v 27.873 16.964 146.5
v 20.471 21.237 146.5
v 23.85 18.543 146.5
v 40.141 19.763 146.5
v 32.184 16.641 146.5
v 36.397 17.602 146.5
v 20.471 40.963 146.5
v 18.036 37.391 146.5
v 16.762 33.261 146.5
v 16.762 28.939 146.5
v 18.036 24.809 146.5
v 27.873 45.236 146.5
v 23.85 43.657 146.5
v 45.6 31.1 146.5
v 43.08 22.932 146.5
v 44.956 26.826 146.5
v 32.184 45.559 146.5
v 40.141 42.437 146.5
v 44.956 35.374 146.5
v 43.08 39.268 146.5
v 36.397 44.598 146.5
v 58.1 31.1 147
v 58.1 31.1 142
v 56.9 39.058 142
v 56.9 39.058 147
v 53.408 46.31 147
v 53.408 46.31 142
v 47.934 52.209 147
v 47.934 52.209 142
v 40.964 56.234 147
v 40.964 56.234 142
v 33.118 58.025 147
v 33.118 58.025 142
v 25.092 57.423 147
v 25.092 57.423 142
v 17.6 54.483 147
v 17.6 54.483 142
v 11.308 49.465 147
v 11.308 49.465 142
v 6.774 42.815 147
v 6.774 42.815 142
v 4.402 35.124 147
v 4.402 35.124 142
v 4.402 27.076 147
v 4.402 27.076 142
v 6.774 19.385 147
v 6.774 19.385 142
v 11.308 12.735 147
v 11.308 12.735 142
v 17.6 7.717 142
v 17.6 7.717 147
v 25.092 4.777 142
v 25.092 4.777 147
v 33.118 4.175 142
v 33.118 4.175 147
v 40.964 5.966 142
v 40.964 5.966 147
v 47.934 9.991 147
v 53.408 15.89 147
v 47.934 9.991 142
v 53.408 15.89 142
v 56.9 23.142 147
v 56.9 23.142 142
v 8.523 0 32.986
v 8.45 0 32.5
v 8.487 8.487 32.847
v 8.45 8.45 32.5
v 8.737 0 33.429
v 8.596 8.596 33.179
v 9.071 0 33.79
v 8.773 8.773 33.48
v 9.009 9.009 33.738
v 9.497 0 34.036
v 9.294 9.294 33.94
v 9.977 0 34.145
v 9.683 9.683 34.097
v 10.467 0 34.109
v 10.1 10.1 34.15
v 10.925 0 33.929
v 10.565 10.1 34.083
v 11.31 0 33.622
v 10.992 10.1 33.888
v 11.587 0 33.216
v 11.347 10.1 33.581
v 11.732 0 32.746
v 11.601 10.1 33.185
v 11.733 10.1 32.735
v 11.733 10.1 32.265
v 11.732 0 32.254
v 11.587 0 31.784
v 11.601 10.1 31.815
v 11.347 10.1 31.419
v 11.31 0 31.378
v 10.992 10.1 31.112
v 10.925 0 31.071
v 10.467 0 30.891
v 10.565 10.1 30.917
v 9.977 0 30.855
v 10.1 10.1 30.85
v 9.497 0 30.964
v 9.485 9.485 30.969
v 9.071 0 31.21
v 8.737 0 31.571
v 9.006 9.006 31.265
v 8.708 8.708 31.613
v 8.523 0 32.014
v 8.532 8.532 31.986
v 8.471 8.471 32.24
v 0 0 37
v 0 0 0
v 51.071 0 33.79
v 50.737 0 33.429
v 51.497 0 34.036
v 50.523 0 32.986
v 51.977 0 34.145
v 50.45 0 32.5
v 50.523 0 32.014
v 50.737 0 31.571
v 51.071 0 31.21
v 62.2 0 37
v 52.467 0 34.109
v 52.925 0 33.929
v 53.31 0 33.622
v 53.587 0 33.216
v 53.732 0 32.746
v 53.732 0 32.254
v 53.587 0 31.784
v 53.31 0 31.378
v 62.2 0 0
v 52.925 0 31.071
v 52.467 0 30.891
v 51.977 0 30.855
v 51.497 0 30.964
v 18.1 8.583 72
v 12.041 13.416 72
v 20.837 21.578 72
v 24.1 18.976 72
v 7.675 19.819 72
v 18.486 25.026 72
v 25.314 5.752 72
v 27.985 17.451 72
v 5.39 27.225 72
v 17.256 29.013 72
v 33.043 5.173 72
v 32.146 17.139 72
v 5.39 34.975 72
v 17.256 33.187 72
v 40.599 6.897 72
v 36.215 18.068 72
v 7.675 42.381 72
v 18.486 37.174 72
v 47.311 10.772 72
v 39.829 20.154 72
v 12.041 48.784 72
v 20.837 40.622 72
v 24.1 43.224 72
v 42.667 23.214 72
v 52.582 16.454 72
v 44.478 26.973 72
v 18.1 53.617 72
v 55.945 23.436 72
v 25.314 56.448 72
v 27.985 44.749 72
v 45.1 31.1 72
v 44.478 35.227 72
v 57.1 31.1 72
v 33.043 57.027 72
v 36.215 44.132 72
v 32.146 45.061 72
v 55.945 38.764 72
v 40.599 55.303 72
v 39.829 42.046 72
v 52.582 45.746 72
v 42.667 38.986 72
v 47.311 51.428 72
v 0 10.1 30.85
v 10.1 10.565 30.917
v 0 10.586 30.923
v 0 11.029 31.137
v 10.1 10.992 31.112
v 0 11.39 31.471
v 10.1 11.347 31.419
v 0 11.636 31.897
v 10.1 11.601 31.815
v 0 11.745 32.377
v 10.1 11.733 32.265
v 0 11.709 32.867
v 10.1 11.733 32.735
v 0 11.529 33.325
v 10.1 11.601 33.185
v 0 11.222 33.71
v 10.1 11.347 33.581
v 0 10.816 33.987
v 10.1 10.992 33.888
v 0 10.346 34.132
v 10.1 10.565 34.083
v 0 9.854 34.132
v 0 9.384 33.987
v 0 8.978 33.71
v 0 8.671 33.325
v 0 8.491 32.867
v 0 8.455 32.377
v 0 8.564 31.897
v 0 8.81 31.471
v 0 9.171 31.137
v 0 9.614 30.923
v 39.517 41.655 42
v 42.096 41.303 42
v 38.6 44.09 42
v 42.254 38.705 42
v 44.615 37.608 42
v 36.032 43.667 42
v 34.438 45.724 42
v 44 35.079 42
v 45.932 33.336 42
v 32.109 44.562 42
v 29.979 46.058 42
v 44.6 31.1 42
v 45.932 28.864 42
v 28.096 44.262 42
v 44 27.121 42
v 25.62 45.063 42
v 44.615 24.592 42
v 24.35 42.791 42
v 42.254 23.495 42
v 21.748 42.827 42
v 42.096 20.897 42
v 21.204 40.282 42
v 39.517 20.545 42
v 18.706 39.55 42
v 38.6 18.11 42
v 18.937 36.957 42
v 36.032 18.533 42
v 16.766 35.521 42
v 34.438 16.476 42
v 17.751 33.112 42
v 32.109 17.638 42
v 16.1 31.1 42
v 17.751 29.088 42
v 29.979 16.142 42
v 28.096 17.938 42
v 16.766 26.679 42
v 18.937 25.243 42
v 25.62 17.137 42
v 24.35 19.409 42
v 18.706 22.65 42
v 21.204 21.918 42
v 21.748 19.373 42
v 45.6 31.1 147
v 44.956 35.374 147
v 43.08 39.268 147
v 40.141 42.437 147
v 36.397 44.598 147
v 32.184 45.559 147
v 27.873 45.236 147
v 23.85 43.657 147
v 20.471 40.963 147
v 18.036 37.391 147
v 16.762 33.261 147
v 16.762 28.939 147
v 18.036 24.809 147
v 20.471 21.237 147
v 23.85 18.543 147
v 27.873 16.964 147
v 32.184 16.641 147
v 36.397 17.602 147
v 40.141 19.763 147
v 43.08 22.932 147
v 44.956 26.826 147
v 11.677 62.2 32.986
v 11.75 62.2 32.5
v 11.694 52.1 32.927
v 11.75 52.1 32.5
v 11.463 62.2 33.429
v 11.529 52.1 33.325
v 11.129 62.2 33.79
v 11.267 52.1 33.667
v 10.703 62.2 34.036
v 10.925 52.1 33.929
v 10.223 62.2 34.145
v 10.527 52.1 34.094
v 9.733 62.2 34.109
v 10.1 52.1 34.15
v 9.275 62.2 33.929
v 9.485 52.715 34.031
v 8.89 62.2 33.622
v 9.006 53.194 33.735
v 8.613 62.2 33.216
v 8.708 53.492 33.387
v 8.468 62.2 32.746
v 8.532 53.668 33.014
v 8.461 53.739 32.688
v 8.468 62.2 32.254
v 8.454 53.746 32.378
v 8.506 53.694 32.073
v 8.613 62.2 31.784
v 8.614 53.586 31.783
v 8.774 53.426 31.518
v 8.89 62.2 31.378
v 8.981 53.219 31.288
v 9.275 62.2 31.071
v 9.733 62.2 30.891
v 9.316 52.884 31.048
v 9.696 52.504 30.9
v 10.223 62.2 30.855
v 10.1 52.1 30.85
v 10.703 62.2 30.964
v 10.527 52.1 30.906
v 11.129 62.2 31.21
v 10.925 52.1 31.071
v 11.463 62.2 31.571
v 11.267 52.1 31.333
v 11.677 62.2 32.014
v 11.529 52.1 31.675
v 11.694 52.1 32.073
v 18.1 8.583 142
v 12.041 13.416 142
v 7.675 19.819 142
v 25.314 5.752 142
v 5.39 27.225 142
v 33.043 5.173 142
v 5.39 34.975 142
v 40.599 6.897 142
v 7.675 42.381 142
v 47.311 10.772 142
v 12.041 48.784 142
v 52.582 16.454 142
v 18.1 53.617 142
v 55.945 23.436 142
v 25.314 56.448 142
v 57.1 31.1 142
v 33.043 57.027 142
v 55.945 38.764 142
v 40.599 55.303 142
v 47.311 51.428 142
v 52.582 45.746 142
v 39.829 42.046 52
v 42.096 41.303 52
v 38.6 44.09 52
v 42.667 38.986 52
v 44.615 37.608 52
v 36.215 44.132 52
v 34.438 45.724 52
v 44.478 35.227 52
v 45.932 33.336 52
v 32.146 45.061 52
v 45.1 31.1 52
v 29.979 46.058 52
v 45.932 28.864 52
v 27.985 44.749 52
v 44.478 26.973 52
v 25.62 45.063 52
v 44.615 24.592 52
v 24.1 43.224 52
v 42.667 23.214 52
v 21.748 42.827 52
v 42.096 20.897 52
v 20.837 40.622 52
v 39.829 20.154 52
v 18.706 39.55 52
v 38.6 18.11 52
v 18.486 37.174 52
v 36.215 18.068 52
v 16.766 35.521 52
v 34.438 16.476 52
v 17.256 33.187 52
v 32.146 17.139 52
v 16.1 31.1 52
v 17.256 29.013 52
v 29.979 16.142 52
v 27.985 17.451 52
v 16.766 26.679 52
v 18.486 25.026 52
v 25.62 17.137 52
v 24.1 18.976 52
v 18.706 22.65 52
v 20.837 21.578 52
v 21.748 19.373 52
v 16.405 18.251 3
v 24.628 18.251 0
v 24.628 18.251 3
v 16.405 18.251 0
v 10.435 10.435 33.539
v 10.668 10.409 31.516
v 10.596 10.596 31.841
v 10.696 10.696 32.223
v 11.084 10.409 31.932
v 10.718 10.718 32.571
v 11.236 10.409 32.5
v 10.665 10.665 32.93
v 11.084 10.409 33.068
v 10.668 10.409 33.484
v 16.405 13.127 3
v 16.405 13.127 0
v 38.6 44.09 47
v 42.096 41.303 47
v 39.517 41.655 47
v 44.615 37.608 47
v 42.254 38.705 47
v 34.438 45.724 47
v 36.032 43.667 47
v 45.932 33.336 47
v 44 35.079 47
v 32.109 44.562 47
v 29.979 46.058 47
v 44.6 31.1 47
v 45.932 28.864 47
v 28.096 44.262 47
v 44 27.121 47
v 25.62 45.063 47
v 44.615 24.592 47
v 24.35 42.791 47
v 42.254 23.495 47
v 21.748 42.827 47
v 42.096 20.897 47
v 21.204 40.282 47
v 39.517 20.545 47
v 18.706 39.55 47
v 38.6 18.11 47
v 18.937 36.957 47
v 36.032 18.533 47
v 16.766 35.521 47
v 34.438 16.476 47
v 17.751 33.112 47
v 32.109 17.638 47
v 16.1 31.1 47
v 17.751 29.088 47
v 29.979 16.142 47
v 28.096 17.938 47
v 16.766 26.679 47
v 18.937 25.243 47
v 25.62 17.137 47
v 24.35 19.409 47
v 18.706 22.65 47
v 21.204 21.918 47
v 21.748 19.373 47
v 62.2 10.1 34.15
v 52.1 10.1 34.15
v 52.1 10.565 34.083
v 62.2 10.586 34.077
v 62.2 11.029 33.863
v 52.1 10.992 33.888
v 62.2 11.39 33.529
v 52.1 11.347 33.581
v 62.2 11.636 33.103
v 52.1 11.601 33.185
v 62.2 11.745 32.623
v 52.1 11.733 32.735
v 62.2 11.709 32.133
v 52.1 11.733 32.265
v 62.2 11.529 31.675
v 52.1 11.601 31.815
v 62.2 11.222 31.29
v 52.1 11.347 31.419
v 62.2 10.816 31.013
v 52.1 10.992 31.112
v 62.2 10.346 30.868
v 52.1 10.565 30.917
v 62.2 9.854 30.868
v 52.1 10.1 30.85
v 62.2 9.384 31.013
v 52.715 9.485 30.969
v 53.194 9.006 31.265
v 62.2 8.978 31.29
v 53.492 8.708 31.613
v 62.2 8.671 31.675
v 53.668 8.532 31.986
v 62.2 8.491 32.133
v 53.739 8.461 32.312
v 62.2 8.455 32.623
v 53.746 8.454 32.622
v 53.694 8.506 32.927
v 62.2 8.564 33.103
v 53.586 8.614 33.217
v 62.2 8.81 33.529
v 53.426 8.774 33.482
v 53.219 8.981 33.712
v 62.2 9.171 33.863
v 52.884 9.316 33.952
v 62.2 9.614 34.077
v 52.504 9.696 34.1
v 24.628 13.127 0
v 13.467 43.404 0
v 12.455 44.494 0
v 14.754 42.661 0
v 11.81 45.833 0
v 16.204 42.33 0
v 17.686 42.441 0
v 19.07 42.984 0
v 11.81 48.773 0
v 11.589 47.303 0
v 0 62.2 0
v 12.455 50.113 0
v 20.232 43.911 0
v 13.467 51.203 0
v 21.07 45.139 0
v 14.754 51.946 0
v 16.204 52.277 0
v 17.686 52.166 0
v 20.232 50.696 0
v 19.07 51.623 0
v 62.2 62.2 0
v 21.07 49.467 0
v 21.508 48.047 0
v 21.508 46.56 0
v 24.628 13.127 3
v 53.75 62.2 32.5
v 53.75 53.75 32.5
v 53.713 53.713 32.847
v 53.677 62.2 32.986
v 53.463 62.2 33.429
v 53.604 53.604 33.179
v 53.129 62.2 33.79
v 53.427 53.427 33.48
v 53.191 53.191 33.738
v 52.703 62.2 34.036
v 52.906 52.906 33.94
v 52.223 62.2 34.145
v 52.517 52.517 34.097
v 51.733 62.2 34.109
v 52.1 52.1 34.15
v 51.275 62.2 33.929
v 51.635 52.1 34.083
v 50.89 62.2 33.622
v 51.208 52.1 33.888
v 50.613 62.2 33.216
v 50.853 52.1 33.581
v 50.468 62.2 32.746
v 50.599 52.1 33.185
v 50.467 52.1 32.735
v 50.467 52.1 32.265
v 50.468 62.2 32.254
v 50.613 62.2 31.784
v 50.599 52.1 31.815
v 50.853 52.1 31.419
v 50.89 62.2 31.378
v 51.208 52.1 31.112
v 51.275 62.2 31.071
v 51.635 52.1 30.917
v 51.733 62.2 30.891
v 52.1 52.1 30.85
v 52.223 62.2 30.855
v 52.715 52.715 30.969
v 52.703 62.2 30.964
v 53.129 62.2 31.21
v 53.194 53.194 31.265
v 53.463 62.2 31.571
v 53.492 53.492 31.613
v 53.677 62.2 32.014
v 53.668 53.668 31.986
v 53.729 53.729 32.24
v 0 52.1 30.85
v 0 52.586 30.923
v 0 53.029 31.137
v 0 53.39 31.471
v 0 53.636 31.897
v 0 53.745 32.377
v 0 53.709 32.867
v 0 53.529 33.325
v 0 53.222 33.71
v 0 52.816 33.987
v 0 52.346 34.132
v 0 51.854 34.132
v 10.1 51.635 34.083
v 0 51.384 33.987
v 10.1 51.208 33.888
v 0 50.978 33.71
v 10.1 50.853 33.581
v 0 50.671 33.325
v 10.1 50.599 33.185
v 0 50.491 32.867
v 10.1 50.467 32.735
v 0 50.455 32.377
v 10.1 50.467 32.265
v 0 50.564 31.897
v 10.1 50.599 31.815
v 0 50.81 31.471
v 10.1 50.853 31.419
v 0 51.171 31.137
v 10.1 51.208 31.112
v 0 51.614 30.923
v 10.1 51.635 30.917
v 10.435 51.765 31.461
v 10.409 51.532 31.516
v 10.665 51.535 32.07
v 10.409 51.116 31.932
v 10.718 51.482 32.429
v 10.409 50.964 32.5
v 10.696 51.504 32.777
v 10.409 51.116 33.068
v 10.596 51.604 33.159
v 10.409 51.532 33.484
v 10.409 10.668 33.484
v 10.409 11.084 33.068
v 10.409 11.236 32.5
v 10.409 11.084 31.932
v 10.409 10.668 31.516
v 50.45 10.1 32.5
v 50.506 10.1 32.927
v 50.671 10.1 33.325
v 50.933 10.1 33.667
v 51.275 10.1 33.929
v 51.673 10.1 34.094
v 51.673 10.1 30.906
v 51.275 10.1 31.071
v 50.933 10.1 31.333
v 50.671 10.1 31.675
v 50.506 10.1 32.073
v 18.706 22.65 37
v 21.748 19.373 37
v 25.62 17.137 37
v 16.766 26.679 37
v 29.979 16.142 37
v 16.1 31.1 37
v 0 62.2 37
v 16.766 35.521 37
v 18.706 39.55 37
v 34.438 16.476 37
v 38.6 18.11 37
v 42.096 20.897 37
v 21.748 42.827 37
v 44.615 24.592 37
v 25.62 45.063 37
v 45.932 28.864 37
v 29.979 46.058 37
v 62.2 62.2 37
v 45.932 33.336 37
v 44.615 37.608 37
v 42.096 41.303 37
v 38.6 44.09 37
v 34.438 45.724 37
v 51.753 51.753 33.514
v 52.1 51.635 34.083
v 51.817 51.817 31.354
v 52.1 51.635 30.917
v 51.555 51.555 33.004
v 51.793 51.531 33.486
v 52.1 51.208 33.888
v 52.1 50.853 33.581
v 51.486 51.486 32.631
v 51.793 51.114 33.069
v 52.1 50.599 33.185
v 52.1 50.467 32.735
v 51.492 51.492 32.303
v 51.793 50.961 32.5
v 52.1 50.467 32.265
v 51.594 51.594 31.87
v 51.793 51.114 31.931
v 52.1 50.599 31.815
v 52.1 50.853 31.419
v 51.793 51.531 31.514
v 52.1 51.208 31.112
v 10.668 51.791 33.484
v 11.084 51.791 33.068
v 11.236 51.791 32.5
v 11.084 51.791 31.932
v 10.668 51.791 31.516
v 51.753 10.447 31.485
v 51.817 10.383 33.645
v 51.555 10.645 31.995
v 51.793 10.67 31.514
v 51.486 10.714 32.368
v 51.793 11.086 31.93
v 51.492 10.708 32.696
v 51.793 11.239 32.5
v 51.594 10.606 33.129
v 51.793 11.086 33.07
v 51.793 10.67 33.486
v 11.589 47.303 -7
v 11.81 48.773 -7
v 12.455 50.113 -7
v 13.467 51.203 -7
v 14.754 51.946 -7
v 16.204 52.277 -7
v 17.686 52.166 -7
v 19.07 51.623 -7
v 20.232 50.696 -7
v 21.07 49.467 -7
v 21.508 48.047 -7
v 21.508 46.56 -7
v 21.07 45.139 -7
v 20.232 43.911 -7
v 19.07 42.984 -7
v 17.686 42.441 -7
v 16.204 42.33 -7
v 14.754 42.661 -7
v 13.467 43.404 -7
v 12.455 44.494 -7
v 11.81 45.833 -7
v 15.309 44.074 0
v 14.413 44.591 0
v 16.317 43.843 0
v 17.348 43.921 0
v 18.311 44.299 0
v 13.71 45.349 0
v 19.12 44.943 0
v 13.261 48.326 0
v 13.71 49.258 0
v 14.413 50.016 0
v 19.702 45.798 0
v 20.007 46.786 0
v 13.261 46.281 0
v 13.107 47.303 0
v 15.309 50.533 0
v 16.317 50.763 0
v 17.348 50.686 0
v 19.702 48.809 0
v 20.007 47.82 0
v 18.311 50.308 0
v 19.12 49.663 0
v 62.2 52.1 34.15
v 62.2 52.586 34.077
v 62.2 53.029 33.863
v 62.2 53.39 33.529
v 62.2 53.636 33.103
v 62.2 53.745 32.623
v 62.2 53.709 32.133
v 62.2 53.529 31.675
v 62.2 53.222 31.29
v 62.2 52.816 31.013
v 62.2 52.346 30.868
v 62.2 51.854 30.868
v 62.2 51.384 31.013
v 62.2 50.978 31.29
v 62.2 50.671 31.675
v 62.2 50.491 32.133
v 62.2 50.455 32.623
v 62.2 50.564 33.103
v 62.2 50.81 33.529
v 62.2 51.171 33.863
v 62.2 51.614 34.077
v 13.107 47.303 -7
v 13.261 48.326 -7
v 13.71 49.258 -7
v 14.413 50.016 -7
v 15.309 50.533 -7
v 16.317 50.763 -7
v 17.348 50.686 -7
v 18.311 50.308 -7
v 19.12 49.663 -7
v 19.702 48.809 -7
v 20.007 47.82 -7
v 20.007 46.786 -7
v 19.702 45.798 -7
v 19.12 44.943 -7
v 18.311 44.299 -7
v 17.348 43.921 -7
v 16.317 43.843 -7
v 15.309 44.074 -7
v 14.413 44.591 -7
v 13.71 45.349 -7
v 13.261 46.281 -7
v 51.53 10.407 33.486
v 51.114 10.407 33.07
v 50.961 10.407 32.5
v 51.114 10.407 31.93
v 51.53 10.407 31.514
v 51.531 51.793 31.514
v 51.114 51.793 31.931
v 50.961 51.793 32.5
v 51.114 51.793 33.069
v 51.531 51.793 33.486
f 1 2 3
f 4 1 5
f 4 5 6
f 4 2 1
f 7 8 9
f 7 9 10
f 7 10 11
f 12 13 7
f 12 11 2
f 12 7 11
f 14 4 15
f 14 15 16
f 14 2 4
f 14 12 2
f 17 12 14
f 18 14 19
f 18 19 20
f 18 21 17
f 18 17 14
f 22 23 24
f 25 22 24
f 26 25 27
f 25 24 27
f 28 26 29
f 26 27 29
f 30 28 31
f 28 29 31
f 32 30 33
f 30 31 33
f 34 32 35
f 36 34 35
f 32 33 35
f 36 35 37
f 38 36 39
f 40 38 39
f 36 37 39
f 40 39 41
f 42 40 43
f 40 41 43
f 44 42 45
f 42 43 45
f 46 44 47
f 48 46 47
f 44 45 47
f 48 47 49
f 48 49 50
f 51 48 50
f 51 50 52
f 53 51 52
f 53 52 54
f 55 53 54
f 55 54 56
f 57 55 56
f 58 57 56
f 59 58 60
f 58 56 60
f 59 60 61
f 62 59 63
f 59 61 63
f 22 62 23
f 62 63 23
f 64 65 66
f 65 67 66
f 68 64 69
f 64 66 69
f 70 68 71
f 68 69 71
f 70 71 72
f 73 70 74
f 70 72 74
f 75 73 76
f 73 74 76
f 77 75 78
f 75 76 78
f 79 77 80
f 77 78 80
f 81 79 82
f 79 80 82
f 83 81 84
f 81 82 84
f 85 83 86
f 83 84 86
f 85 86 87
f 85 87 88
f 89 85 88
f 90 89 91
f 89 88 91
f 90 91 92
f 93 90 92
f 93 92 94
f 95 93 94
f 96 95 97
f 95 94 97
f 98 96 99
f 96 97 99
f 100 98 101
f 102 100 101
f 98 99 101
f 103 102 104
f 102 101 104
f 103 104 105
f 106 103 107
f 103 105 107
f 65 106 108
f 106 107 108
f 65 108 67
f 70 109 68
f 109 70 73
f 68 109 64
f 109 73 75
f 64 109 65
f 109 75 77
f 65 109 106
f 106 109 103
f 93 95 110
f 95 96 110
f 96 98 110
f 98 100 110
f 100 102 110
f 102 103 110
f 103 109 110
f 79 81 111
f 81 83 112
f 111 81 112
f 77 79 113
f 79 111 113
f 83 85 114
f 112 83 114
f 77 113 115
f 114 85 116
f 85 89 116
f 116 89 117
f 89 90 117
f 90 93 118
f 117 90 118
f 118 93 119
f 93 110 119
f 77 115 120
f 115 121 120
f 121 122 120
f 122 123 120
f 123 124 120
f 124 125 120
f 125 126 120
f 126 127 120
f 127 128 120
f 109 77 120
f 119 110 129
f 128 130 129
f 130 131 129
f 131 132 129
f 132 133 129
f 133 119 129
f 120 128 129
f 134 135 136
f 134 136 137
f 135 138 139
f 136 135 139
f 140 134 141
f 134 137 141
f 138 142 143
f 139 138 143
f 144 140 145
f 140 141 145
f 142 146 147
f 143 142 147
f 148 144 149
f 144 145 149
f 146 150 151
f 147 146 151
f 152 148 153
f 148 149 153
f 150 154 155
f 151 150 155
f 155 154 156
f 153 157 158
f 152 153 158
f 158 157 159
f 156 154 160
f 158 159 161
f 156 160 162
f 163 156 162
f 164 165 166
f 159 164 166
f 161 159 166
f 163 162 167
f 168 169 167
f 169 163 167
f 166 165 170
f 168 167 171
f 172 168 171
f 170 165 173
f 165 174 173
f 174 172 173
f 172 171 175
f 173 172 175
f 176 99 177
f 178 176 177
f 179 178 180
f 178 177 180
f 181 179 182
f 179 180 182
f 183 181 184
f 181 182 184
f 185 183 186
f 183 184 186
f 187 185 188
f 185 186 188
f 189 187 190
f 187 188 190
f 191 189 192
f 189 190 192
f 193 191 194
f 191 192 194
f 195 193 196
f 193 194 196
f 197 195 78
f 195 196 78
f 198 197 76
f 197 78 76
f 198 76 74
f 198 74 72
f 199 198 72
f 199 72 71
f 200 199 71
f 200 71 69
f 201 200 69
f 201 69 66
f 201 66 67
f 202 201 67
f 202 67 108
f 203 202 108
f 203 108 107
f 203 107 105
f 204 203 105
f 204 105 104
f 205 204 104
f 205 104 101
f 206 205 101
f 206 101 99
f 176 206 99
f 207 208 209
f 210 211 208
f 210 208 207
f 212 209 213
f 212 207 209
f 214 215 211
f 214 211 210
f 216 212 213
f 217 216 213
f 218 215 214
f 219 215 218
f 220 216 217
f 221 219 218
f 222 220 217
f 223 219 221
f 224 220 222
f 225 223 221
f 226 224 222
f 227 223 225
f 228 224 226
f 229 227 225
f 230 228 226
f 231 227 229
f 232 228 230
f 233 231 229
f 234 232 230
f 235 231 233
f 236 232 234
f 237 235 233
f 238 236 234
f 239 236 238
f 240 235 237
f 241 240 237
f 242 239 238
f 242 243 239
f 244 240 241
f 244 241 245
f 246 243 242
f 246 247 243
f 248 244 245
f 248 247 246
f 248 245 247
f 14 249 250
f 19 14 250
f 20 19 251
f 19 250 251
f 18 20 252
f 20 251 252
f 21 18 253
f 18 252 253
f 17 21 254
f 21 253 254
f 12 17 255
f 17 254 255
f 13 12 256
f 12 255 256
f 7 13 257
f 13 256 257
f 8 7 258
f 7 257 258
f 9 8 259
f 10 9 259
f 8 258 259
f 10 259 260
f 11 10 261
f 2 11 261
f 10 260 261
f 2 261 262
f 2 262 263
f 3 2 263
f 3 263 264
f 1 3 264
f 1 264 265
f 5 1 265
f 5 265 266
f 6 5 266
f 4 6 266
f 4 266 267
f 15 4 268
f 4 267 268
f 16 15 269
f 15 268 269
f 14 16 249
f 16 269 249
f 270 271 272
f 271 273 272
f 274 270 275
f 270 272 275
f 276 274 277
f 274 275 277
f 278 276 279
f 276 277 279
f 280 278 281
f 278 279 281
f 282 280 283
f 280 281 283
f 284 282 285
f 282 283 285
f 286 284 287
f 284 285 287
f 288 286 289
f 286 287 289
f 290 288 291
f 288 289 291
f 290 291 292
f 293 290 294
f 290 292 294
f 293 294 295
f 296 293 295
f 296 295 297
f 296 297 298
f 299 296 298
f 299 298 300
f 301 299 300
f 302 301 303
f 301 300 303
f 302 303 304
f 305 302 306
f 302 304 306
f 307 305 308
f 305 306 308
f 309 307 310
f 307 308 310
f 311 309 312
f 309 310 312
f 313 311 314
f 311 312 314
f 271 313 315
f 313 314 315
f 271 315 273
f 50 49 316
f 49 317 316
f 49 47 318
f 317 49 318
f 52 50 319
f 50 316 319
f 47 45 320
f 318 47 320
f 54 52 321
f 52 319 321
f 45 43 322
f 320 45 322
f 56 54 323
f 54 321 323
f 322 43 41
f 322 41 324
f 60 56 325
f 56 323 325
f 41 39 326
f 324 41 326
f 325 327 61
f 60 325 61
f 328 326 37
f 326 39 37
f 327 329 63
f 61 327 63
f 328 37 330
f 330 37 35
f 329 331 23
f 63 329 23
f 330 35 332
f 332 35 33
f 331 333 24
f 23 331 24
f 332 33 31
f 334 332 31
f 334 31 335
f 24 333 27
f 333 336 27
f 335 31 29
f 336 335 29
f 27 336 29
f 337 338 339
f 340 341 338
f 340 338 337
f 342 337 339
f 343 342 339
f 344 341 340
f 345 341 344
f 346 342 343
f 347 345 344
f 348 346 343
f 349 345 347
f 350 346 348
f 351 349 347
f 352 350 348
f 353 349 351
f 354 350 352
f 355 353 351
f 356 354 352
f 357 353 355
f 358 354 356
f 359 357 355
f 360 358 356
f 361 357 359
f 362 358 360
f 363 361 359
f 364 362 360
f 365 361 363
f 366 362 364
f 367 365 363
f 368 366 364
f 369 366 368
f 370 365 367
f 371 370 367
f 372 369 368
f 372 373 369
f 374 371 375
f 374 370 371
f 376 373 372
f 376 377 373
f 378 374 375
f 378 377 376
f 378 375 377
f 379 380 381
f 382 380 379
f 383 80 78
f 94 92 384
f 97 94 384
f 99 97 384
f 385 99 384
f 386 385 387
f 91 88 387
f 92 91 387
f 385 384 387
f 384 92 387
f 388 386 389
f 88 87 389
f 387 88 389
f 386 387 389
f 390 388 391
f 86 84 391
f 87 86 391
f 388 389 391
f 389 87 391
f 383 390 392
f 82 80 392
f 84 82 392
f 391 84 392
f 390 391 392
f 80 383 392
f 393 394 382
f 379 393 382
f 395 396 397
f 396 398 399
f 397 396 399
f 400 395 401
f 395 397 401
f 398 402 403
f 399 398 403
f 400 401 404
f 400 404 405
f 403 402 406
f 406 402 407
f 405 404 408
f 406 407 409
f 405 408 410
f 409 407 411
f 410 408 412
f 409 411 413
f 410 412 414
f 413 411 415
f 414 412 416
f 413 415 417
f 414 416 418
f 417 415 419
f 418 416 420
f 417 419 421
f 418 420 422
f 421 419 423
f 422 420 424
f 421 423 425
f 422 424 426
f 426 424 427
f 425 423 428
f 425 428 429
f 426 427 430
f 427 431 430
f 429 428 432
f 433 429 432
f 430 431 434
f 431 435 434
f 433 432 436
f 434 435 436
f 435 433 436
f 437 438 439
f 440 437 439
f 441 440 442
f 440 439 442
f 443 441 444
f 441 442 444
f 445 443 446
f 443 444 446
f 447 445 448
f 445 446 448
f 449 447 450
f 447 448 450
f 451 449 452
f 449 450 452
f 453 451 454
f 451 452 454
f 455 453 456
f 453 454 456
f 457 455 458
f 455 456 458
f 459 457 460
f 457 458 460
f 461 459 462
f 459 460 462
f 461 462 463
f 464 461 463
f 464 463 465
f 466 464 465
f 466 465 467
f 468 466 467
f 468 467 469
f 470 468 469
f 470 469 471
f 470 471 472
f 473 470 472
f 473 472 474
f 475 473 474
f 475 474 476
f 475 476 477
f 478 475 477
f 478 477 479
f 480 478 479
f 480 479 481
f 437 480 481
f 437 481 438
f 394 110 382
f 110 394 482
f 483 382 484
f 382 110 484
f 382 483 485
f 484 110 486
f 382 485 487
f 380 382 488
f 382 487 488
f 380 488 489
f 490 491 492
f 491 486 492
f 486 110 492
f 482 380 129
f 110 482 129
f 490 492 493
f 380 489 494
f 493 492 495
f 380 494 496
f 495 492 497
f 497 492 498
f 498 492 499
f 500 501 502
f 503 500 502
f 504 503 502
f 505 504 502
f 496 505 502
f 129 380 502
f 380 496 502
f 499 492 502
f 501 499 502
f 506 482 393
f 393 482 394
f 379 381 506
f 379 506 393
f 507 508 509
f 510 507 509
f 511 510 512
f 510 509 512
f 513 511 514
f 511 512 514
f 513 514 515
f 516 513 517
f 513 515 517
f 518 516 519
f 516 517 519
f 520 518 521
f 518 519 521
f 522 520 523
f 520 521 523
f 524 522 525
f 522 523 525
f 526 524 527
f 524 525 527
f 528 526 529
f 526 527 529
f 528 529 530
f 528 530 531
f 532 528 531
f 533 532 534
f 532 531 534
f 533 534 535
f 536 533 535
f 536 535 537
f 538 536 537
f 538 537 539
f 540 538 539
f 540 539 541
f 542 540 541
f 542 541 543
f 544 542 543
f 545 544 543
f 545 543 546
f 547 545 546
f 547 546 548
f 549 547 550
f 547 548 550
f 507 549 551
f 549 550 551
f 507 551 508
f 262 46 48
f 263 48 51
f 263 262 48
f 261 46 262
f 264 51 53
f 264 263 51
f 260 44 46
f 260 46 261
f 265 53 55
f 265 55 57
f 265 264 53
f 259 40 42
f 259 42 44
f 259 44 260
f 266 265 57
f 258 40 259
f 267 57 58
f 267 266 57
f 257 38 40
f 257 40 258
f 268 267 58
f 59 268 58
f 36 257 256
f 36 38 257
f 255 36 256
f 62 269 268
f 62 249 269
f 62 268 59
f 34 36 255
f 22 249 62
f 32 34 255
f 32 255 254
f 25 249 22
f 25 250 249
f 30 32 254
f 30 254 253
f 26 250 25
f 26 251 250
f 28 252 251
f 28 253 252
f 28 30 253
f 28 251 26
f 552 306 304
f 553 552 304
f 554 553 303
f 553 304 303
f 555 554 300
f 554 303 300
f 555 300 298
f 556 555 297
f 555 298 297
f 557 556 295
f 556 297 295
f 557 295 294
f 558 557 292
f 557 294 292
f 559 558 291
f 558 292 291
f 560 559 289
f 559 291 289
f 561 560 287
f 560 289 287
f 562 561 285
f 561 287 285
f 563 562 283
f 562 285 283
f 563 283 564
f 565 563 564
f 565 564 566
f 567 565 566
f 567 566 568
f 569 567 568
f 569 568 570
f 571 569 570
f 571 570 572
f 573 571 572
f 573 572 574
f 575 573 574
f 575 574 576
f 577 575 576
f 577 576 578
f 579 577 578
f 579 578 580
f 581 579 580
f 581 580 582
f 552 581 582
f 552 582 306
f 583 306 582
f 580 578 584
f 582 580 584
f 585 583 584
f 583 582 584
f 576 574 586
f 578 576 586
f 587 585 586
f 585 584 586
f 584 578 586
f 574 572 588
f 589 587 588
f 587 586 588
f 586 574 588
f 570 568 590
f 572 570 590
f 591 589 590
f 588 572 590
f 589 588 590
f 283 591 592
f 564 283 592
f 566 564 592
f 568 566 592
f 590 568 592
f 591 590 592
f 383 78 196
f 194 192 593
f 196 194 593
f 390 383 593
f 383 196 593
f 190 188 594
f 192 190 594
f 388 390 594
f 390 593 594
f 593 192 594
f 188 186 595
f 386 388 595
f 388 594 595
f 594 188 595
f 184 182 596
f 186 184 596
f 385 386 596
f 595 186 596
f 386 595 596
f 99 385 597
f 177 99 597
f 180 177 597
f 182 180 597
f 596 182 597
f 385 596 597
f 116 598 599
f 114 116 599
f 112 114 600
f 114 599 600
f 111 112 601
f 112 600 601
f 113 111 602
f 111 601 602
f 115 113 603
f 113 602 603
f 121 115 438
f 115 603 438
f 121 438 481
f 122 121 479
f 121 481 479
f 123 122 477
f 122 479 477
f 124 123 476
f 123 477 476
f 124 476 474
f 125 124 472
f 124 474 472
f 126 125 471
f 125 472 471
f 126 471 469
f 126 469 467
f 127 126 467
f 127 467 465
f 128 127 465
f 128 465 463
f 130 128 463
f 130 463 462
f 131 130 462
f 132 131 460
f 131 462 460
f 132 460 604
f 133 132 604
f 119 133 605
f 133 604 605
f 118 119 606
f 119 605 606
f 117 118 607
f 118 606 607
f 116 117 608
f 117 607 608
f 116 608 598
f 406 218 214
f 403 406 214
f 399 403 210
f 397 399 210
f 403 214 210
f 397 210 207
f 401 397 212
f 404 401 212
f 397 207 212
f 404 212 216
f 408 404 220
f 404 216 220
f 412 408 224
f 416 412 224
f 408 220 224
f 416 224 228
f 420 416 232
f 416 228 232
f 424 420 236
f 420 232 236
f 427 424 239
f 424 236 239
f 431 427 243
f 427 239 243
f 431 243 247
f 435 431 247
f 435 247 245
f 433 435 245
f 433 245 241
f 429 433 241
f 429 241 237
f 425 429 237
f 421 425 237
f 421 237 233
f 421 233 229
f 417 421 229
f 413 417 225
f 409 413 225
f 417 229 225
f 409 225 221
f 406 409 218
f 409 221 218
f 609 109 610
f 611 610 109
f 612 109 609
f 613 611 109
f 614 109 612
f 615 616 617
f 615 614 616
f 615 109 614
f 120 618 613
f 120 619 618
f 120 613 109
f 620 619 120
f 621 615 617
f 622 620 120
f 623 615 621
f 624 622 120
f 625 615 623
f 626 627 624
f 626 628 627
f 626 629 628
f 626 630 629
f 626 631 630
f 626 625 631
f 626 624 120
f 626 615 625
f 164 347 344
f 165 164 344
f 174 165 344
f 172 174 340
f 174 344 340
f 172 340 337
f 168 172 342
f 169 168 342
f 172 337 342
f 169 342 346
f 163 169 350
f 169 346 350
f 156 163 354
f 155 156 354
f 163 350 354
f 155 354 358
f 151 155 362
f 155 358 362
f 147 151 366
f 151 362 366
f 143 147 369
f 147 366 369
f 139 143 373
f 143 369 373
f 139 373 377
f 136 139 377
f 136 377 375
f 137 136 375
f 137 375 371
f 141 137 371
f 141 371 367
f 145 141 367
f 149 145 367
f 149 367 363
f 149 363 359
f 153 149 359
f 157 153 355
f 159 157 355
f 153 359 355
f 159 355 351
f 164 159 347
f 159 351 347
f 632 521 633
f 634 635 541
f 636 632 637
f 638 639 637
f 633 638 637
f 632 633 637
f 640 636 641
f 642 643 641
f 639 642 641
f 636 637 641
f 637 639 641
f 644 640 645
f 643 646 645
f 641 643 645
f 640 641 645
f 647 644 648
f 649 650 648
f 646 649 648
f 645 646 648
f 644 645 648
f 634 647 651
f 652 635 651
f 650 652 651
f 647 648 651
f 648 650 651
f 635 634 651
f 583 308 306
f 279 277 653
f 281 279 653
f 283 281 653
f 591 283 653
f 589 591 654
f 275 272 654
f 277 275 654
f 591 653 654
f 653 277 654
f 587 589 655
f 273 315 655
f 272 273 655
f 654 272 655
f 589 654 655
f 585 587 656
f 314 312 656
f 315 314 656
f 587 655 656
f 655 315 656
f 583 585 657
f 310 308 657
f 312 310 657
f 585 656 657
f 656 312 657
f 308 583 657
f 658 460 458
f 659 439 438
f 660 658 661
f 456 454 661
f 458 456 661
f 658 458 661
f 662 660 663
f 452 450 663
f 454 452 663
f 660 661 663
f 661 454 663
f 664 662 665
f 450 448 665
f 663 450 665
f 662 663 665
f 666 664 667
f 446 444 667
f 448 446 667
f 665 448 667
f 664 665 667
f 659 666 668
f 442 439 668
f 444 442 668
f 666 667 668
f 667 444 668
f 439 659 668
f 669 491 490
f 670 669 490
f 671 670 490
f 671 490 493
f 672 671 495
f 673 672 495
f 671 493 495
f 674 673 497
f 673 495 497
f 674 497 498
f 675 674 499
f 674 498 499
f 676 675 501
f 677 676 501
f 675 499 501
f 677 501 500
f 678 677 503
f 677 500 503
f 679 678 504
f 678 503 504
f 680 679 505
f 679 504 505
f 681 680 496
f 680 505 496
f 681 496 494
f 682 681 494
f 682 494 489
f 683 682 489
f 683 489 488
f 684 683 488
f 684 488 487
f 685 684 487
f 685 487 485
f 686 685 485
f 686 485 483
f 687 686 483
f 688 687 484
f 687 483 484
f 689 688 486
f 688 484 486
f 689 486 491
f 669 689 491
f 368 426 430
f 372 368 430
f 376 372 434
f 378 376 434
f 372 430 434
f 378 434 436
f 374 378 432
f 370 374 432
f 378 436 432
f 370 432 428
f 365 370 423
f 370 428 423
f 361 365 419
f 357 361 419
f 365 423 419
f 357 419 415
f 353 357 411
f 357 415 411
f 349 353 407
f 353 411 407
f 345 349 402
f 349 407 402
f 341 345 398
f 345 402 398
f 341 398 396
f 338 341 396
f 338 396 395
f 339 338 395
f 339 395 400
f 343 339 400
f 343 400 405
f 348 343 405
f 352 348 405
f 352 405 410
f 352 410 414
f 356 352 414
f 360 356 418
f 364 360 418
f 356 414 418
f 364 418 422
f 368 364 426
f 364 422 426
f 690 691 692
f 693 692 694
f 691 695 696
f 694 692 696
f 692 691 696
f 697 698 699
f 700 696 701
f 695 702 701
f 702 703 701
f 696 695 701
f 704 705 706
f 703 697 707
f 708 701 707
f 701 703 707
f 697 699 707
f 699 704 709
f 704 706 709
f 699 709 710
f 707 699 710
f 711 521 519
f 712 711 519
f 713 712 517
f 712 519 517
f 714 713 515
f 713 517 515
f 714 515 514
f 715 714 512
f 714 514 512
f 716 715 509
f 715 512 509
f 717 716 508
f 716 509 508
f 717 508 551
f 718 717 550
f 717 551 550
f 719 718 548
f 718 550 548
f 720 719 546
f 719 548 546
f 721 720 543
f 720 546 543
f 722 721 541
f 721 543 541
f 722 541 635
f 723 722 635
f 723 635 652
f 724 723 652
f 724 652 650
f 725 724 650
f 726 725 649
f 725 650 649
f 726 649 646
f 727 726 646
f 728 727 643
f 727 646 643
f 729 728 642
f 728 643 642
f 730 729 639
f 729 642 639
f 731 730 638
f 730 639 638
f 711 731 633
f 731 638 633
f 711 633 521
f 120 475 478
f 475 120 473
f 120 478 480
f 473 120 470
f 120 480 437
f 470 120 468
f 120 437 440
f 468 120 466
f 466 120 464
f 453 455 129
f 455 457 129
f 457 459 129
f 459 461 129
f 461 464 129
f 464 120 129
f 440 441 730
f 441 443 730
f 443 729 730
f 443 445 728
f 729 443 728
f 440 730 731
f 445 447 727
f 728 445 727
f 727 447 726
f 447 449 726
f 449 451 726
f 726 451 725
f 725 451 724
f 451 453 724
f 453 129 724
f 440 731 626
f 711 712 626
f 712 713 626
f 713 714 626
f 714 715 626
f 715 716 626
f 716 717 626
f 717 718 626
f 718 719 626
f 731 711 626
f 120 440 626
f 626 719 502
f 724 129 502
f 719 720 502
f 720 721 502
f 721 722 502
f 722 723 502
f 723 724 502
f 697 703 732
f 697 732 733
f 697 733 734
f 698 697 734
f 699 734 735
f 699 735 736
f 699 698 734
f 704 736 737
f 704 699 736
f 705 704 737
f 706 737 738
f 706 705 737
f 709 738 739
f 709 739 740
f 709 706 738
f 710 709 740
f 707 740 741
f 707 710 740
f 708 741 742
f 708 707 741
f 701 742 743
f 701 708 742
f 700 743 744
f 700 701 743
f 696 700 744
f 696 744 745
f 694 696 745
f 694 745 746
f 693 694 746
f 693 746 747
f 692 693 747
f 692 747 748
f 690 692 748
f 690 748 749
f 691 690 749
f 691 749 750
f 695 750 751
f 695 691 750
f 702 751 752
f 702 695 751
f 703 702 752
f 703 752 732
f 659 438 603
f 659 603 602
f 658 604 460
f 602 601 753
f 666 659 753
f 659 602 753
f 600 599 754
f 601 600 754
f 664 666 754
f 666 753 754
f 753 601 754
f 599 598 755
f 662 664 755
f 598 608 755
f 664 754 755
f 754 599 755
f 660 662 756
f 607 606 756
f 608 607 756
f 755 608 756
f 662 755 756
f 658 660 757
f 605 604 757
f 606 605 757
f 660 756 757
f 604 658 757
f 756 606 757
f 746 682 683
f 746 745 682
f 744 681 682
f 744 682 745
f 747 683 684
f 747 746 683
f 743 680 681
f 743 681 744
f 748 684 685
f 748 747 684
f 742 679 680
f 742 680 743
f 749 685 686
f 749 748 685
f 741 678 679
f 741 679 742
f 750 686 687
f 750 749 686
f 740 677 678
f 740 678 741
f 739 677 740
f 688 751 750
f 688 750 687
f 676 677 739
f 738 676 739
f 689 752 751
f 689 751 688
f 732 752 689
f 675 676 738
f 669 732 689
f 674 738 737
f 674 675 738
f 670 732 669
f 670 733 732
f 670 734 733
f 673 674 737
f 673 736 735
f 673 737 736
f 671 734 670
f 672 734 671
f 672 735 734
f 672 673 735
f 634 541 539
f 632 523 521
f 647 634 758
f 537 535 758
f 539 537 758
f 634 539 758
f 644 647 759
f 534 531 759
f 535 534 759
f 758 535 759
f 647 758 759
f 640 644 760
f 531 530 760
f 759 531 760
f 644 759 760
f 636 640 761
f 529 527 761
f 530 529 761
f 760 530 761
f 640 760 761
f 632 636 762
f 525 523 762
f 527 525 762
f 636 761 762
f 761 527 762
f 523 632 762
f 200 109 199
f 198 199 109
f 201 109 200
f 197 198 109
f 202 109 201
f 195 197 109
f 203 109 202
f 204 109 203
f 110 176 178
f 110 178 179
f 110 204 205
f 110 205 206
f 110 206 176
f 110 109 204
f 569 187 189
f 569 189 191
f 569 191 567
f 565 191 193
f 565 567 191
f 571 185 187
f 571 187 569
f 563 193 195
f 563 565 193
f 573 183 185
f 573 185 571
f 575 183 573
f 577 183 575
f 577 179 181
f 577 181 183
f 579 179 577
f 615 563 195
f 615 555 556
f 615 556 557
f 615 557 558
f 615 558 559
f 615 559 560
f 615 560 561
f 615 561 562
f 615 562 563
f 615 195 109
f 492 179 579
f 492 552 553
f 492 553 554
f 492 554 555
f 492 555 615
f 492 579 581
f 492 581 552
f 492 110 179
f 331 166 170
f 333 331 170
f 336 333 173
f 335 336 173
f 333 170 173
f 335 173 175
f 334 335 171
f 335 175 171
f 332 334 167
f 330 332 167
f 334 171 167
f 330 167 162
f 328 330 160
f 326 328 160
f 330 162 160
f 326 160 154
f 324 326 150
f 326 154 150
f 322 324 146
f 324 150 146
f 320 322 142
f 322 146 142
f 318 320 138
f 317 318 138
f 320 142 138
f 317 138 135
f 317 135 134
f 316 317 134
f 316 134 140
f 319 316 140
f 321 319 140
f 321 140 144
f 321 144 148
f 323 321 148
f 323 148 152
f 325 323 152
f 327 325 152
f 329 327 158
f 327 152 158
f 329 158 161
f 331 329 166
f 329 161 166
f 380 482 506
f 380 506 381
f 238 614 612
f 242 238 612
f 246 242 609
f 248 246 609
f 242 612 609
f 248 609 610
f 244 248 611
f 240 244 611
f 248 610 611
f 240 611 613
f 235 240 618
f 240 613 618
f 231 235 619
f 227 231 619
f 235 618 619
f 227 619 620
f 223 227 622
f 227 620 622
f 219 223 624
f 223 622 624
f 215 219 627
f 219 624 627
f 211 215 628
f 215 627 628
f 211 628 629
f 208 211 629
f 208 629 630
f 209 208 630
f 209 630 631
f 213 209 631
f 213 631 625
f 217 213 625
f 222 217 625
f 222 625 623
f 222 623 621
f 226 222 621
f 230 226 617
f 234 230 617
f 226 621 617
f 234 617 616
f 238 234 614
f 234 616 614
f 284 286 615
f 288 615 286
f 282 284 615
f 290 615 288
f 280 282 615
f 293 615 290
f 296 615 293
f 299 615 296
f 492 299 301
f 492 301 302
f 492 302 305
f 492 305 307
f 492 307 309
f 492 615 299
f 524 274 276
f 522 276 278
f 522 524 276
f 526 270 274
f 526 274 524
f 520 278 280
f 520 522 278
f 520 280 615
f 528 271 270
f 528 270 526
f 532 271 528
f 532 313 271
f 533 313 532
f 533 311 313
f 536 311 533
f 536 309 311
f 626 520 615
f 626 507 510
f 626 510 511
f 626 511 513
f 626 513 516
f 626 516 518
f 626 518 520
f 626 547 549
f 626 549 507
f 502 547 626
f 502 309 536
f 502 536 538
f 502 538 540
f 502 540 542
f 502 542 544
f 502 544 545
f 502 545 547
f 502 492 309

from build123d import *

# Parameters (mm, degrees)
SKETCH_1_W             = 62.2
SKETCH_1_H             = 62.2
EXTRUDE_1_DEPTH        = 37
SKETCH_2_R             = 15
EXTRUDE_2_DEPTH        = 5
SKETCH_3_R             = 13.5
EXTRUDE_3_DEPTH        = 5
SKETCH_4_R             = 15
EXTRUDE_4_DEPTH        = 5
SKETCH_5_R             = 14
EXTRUDE_5_DEPTH        = 20
SKETCH_6_R             = 26
EXTRUDE_6_DEPTH        = 70
SKETCH_7_R             = 27
EXTRUDE_7_DEPTH        = 5
SKETCH_8_R             = 14.5
CUT_EXTRUDE_1_DEPTH    = 0.5
SKETCH_9_R             = 4.987570285
SKETCH_9_R_2           = 3.46960963
EXTRUDE_8_DEPTH        = 7
SKETCH_10_W            = 8.223130645
SKETCH_10_H            = 5.124180357
CUT_EXTRUDE_2_DEPTH    = 3
HOLE_WIZARD_M4_1_D     = 3.3
HOLE_WIZARD_M4_1_DEPTH = 10.1
HOLE_WIZARD_M4_1_TIP   = 0.991420021
HOLE_WIZARD_M4_2_D     = 3.3
HOLE_WIZARD_M4_2_DEPTH = 10.1
HOLE_WIZARD_M4_2_TIP   = 0.991420021
HOLE_WIZARD_M4_3_D     = 3.3
HOLE_WIZARD_M4_3_DEPTH = 10.1
HOLE_WIZARD_M4_3_TIP   = 0.991420021
HOLE_WIZARD_M4_4_D     = 3.3
HOLE_WIZARD_M4_4_DEPTH = 10.1
HOLE_WIZARD_M4_4_TIP   = 0.991420021


with BuildPart() as part:
    # 草图1 → 凸台-拉伸1 (new body)
    with BuildSketch(Plane.XY):
        with Locations((31.1, 31.1)):
            Rectangle(SKETCH_1_W, SKETCH_1_H)
    extrude(amount=EXTRUDE_1_DEPTH)

    # 草图2 → 凸台-拉伸2 (add)
    with BuildSketch(Plane.XY.offset(37)):
        with Locations(Location((31.1, 31.1, 0), (0, 0, 180))):
            Circle(SKETCH_2_R)
    extrude(amount=EXTRUDE_2_DEPTH)

    # 草图3 → 凸台-拉伸3 (add)
    with BuildSketch(Plane.XY.offset(42)):
        with Locations((31.1, 31.1)):
            Circle(SKETCH_3_R)
    extrude(amount=EXTRUDE_3_DEPTH)

    # 草图4 → 凸台-拉伸4 (add)
    with BuildSketch(Plane.XY.offset(47)):
        with Locations(Location((31.1, 31.1, 0), (0, 0, 180))):
            Circle(SKETCH_4_R)
    extrude(amount=EXTRUDE_4_DEPTH)

    # 草图5 → 凸台-拉伸5 (add)
    with BuildSketch(Plane.XY.offset(52)):
        with Locations((31.1, 31.1)):
            Circle(SKETCH_5_R)
    extrude(amount=EXTRUDE_5_DEPTH)

    # 草图6 → 凸台-拉伸6 (add)
    with BuildSketch(Plane.XY.offset(72)):
        with Locations((31.1, 31.1)):
            Circle(SKETCH_6_R)
    extrude(amount=EXTRUDE_6_DEPTH)

    # 草图7 → 凸台-拉伸7 (add)
    with BuildSketch(Plane.XY.offset(142)):
        with Locations((31.1, 31.1)):
            Circle(SKETCH_7_R)
    extrude(amount=EXTRUDE_7_DEPTH)

    # 草图8 → 切除-拉伸1 (cut)
    with BuildSketch(Plane.XY.offset(147)):
        with Locations((31.1, 31.1)):
            Circle(SKETCH_8_R)
    extrude(amount=-CUT_EXTRUDE_1_DEPTH, mode=Mode.SUBTRACT)

    # 草图9 → 凸台-拉伸8 (add)
    with BuildSketch(Plane(origin=(0, 0, 0), x_dir=(-1, 0, 0), z_dir=(0, 0, -1))):
        with Locations((-16.576254003, 47.30330958)):
            Circle(SKETCH_9_R)
        with Locations((-16.576254003, 47.30330958)):
            Circle(SKETCH_9_R_2, mode=Mode.SUBTRACT)
    extrude(amount=EXTRUDE_8_DEPTH)

    # 草图10 → 切除-拉伸2 (cut)
    with BuildSketch(Plane(origin=(0, 0, 0), x_dir=(-1, 0, 0), z_dir=(0, 0, -1))):
        with Locations((-20.516916702, 15.688590304)):
            Rectangle(SKETCH_10_W, SKETCH_10_H)
    extrude(amount=-CUT_EXTRUDE_2_DEPTH, mode=Mode.SUBTRACT)

    # M4 螺纹孔1
    with Locations(Plane(origin=(0, 62.2, 0), x_dir=(-1, 0, 0), z_dir=(0, 1, 0))):
        with Locations((-10.1, 32.5), (-52.1, 32.5)):
            Hole(HOLE_WIZARD_M4_1_D / 2, depth=HOLE_WIZARD_M4_1_DEPTH)
            with Locations((0, 0, -(HOLE_WIZARD_M4_1_DEPTH + HOLE_WIZARD_M4_1_TIP / 2))):  # 118° drill point
                Cone(0, HOLE_WIZARD_M4_1_D / 2, HOLE_WIZARD_M4_1_TIP, mode=Mode.SUBTRACT)

    # M4 螺纹孔2
    with Locations(Plane(origin=(62.2, 0, 0), x_dir=(0, 0, -1), z_dir=(1, 0, 0))):
        with Locations((-32.5, 10.1), (-32.5, 52.1)):
            Hole(HOLE_WIZARD_M4_2_D / 2, depth=HOLE_WIZARD_M4_2_DEPTH)
            with Locations((0, 0, -(HOLE_WIZARD_M4_2_DEPTH + HOLE_WIZARD_M4_2_TIP / 2))):  # 118° drill point
                Cone(0, HOLE_WIZARD_M4_2_D / 2, HOLE_WIZARD_M4_2_TIP, mode=Mode.SUBTRACT)

    # M4 螺纹孔3
    with Locations(Plane.XZ):
        with Locations((10.1, 32.5), (52.1, 32.5)):
            Hole(HOLE_WIZARD_M4_3_D / 2, depth=HOLE_WIZARD_M4_3_DEPTH)
            with Locations((0, 0, -(HOLE_WIZARD_M4_3_DEPTH + HOLE_WIZARD_M4_3_TIP / 2))):  # 118° drill point
                Cone(0, HOLE_WIZARD_M4_3_D / 2, HOLE_WIZARD_M4_3_TIP, mode=Mode.SUBTRACT)

    # M4 螺纹孔4
    with Locations(Plane.ZY):
        with Locations((32.5, 52.1), (32.5, 10.1)):
            Hole(HOLE_WIZARD_M4_4_D / 2, depth=HOLE_WIZARD_M4_4_DEPTH)
            with Locations((0, 0, -(HOLE_WIZARD_M4_4_DEPTH + HOLE_WIZARD_M4_4_TIP / 2))):  # 118° drill point
                Cone(0, HOLE_WIZARD_M4_4_D / 2, HOLE_WIZARD_M4_4_TIP, mode=Mode.SUBTRACT)


solid = part.part
